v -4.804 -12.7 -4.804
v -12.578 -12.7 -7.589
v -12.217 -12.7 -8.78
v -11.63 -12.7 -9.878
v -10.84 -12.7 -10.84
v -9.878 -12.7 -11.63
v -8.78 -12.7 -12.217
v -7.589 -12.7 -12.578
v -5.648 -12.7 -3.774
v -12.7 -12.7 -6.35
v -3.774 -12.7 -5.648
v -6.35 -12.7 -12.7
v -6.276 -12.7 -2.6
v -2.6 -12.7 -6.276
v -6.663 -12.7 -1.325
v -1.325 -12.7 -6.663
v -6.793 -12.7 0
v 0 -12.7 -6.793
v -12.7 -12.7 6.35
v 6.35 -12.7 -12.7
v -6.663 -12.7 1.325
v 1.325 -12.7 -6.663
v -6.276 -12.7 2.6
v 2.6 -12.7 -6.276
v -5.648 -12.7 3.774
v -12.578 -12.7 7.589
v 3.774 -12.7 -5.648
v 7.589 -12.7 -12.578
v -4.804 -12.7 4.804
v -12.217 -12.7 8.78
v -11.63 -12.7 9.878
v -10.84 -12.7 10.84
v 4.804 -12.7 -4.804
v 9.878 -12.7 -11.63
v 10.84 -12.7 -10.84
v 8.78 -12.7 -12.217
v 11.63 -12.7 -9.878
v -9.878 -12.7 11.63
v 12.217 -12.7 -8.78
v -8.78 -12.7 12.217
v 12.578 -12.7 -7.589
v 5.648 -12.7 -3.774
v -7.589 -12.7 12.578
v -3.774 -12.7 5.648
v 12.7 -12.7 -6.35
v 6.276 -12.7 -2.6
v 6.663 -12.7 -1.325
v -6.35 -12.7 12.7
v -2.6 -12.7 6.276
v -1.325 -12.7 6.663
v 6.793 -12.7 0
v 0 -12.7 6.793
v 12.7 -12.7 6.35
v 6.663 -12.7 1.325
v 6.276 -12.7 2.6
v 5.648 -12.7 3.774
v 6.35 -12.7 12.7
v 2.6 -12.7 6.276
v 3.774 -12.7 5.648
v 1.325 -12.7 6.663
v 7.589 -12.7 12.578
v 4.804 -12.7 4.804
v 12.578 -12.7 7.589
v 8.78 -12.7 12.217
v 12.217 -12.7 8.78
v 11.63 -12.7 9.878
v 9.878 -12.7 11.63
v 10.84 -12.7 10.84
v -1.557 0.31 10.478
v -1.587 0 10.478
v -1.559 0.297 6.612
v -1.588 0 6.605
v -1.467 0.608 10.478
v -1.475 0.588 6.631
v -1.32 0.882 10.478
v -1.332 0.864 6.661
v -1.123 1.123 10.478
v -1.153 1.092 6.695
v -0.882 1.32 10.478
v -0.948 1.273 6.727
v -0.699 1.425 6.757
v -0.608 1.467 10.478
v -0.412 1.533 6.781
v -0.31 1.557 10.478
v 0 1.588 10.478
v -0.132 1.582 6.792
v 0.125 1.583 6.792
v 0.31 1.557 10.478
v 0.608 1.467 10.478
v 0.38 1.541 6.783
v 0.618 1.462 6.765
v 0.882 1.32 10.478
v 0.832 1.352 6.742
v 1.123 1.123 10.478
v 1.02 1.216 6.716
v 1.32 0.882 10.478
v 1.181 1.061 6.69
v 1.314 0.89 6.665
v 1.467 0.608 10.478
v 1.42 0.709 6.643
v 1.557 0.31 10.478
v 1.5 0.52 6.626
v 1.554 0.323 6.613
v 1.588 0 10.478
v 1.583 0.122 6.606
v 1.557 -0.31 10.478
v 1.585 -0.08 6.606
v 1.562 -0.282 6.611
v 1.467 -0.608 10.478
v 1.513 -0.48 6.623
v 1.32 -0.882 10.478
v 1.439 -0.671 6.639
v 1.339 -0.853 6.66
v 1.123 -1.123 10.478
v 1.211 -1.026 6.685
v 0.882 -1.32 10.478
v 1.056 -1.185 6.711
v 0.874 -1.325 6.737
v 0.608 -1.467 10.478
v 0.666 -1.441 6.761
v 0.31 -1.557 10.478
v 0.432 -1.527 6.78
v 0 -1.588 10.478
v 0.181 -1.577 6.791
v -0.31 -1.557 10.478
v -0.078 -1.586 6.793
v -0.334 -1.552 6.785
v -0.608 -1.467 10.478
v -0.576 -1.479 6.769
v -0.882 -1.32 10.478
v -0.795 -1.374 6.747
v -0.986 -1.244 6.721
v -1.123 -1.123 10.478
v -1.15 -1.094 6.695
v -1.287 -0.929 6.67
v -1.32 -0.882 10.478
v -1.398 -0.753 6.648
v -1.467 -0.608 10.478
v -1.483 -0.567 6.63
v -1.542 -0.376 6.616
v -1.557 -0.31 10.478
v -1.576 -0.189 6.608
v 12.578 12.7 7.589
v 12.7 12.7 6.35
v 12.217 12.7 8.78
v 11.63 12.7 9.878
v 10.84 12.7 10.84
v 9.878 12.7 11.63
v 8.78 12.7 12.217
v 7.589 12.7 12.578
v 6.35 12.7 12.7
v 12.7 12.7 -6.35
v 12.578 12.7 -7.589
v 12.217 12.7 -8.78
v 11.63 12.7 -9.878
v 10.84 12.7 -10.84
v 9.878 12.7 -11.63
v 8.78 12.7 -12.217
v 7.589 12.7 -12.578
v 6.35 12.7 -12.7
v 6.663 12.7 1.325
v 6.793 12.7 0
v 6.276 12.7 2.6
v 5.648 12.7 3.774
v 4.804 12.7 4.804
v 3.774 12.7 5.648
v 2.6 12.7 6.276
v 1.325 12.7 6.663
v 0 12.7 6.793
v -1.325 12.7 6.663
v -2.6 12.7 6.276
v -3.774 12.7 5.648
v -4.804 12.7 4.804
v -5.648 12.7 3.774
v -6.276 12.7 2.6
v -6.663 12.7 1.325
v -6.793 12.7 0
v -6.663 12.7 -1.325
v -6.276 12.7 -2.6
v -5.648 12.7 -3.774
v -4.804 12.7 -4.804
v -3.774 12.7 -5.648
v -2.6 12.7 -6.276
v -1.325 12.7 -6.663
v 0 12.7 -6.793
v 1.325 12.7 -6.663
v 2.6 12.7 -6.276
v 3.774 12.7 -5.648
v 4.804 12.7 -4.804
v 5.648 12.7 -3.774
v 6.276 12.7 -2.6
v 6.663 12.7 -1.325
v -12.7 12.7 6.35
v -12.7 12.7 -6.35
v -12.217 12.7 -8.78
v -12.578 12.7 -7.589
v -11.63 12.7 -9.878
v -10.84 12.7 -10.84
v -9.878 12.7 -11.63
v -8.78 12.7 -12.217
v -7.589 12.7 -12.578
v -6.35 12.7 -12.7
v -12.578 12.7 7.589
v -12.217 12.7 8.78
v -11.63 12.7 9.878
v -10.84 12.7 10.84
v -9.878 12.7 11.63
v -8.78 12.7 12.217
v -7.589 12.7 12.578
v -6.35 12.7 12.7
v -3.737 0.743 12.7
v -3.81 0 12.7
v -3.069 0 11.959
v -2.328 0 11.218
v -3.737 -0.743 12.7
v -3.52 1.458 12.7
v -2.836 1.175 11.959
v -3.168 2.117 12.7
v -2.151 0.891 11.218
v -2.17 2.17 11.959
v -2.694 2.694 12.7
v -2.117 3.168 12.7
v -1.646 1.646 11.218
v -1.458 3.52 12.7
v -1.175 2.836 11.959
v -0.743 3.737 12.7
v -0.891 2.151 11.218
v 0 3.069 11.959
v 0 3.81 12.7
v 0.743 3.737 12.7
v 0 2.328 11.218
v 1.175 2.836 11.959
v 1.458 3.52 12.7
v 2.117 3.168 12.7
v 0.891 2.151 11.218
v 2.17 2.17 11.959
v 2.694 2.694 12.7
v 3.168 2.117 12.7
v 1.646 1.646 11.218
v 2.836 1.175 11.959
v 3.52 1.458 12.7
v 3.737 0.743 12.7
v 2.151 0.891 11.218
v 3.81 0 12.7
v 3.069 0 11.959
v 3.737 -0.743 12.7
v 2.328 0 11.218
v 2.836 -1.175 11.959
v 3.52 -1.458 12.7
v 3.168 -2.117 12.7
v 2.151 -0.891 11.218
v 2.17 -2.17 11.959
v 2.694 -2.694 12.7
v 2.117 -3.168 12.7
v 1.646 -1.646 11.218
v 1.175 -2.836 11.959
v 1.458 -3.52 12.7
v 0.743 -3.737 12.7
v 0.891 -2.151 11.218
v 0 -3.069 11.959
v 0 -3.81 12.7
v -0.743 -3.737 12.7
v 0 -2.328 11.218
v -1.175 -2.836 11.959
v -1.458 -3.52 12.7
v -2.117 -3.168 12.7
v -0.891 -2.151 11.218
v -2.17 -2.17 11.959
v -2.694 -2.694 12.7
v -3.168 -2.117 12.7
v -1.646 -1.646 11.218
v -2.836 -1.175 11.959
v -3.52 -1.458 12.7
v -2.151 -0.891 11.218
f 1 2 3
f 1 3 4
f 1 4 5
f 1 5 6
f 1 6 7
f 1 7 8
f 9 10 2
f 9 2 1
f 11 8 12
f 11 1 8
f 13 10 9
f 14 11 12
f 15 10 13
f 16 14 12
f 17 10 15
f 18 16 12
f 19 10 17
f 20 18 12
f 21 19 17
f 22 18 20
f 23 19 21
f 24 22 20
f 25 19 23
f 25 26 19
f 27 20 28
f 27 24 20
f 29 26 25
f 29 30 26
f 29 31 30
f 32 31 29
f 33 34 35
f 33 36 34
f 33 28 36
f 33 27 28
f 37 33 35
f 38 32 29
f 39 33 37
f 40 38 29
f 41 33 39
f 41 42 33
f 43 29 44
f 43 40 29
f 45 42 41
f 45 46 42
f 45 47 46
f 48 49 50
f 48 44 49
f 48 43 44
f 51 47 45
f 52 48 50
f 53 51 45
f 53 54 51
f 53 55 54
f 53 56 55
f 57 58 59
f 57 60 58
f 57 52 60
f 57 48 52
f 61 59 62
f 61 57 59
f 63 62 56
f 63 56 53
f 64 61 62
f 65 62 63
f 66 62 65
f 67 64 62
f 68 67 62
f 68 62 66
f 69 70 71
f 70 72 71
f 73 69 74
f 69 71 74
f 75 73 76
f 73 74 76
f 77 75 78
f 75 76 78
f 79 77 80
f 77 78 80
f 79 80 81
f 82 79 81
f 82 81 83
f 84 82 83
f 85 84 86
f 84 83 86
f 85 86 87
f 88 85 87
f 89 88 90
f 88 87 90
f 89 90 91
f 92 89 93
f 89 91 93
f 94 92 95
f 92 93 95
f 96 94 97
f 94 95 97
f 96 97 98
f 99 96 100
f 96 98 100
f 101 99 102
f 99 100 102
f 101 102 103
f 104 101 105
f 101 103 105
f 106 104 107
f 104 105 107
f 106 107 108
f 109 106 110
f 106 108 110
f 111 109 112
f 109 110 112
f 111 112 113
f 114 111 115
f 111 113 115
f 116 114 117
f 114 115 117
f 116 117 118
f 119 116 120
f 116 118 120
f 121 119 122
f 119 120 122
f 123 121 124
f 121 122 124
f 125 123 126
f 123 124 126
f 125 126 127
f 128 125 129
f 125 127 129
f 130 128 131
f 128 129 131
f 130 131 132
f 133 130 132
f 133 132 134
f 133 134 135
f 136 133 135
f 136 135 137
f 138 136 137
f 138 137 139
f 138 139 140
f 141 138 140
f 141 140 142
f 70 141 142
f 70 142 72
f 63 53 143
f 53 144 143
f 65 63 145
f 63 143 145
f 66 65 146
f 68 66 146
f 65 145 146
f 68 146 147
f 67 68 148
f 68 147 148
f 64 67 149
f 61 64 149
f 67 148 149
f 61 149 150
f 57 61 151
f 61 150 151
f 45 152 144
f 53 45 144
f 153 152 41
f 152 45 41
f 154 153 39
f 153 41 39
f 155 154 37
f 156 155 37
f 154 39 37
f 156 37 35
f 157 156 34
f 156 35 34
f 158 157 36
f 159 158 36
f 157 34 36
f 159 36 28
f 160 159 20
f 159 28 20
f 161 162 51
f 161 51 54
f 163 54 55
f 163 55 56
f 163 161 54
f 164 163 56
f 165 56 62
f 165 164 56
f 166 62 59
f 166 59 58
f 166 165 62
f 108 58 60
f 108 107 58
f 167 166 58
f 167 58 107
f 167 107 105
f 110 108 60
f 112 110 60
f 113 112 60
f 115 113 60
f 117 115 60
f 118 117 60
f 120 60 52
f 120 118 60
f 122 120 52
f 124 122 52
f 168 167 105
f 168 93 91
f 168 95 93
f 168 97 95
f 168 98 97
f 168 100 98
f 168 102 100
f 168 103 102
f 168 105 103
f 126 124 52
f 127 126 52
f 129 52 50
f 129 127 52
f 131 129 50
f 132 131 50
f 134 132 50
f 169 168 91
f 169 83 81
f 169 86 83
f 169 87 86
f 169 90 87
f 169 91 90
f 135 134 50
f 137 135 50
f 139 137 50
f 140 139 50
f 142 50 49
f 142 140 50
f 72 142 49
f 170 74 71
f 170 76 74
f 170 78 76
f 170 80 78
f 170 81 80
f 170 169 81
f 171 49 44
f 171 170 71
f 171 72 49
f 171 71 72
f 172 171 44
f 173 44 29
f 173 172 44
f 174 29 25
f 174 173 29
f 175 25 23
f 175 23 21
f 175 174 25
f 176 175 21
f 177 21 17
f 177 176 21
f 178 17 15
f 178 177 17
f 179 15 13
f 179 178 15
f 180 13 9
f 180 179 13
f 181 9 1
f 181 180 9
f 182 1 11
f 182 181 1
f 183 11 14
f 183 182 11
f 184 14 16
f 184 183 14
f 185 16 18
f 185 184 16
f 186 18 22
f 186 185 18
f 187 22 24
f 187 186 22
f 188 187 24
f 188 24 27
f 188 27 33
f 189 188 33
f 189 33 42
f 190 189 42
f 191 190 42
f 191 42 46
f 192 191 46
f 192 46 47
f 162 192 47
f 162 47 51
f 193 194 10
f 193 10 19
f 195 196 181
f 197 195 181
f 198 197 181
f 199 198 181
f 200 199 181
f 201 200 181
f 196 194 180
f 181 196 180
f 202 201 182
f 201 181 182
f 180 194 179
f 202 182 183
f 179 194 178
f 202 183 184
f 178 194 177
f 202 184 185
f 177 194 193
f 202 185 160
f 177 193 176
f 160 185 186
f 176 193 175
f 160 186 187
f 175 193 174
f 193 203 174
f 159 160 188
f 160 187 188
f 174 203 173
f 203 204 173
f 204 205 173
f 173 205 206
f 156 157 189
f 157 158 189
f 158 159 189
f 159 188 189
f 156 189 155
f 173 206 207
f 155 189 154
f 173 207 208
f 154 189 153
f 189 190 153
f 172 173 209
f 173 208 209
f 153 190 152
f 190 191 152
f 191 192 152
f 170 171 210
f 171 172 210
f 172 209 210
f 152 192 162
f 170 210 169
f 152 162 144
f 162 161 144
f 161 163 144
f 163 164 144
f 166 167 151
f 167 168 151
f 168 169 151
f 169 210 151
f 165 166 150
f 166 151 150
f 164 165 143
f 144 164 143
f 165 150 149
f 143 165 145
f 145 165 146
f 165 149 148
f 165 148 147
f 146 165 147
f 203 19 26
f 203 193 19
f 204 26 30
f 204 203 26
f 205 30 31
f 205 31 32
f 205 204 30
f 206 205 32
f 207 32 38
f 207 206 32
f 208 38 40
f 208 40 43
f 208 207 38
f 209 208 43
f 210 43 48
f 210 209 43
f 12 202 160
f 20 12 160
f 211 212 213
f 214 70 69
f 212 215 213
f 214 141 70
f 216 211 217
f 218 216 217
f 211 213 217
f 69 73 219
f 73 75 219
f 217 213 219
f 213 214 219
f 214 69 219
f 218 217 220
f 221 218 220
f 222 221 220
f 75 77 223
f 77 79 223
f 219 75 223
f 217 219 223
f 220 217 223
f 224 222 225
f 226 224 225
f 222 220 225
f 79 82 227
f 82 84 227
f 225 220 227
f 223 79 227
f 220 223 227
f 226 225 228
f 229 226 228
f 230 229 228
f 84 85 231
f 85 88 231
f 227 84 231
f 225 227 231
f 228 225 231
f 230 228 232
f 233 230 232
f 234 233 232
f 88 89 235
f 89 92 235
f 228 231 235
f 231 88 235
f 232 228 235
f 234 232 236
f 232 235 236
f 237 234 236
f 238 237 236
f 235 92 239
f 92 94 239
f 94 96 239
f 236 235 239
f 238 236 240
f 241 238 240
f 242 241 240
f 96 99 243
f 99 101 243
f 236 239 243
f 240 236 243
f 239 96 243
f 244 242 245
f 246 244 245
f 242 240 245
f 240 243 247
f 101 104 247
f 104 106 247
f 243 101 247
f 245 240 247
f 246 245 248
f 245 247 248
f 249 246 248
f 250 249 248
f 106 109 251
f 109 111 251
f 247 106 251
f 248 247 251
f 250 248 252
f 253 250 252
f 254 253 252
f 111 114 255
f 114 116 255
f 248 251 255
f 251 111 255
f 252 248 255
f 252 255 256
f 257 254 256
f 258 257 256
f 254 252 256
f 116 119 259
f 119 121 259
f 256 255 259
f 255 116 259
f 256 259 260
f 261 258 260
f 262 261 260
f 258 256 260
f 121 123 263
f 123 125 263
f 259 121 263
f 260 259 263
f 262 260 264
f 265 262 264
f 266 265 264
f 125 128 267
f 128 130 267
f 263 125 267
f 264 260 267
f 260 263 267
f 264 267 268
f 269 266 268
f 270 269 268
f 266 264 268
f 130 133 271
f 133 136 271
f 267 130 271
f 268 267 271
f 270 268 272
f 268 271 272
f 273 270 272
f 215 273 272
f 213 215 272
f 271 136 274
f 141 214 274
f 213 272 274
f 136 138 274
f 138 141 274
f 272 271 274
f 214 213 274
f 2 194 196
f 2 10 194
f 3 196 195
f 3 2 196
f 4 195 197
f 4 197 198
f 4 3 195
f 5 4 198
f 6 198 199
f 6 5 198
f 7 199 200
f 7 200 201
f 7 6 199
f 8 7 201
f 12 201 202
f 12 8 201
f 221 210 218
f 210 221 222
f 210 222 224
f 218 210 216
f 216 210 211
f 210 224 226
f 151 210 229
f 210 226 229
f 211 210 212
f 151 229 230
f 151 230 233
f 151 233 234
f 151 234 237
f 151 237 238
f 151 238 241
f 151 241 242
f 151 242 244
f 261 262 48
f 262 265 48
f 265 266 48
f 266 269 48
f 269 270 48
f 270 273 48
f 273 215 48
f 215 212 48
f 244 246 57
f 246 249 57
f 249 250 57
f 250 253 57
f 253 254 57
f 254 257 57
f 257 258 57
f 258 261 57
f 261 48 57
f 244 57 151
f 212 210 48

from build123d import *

# Parameters (mm, degrees)
F0_W           = 25.4
F0_H           = 25.4
F0_R           = 6.793342
F1_DEPTH       = 12.7
F2_R           = 6.35
F4_D           = 3.175
F4_DEPTH       = 12.7
F4_CSINK_D     = 7.62
F4_CSINK_ANGLE = 90


with BuildPart() as f1:
    # F0 (on Front) → F1 (new body, symmetric)
    with BuildSketch(Plane.XZ):
        Rectangle(F0_W, F0_H)
        Circle(F0_R, mode=Mode.SUBTRACT)
    extrude(amount=F1_DEPTH, both=True)

    # F2
    f2_edges = [f1.edges().sort_by_distance(p)[0] for p in [
        (12.7, 0, 12.7),
        (-12.7, 0, 12.7),
        (-12.7, 0, -12.7),
        (12.7, 0, -12.7),
    ]]
    fillet(f2_edges, radius=F2_R)

    # F4
    with Locations(Plane.XY.offset(12.7)):
        with Locations((0, 0)):
            CounterSinkHole(F4_D / 2, F4_CSINK_D / 2, depth=F4_DEPTH, counter_sink_angle=F4_CSINK_ANGLE)


solid = f1.part
